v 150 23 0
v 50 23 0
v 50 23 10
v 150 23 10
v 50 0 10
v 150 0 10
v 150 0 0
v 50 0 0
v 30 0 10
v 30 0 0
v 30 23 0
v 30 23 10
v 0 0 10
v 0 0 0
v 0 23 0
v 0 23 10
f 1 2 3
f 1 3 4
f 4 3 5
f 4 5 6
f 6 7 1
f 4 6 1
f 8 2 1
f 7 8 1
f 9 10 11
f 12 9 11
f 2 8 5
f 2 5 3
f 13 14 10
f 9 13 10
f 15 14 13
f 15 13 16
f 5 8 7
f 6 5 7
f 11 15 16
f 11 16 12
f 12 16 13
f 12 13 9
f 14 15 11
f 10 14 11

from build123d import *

# Parameters (mm, degrees)
BOX020_W     = 100
BOX020_H     = 23
BOX020_DEPTH = 10
BOX019_W     = 30
BOX019_H     = 23
BOX019_DEPTH = 10


with BuildPart() as box020:
    # Box020 → Box020 (new body)
    with BuildSketch(Plane(origin=(50, 0, 0), x_dir=(1, 0, 0), z_dir=(0, 0, 1))):
        with Locations((50, 11.5)):
            Rectangle(BOX020_W, BOX020_H)
    extrude(amount=BOX020_DEPTH)


with BuildPart() as fusion007:
    # Box019 → Box019 (new body)
    with BuildSketch(Plane.XY):
        with Locations((15, 11.5)):
            Rectangle(BOX019_W, BOX019_H)
    extrude(amount=BOX019_DEPTH)

    # Fusion007: union Box020
    add(box020.part)


solid = fusion007.part
